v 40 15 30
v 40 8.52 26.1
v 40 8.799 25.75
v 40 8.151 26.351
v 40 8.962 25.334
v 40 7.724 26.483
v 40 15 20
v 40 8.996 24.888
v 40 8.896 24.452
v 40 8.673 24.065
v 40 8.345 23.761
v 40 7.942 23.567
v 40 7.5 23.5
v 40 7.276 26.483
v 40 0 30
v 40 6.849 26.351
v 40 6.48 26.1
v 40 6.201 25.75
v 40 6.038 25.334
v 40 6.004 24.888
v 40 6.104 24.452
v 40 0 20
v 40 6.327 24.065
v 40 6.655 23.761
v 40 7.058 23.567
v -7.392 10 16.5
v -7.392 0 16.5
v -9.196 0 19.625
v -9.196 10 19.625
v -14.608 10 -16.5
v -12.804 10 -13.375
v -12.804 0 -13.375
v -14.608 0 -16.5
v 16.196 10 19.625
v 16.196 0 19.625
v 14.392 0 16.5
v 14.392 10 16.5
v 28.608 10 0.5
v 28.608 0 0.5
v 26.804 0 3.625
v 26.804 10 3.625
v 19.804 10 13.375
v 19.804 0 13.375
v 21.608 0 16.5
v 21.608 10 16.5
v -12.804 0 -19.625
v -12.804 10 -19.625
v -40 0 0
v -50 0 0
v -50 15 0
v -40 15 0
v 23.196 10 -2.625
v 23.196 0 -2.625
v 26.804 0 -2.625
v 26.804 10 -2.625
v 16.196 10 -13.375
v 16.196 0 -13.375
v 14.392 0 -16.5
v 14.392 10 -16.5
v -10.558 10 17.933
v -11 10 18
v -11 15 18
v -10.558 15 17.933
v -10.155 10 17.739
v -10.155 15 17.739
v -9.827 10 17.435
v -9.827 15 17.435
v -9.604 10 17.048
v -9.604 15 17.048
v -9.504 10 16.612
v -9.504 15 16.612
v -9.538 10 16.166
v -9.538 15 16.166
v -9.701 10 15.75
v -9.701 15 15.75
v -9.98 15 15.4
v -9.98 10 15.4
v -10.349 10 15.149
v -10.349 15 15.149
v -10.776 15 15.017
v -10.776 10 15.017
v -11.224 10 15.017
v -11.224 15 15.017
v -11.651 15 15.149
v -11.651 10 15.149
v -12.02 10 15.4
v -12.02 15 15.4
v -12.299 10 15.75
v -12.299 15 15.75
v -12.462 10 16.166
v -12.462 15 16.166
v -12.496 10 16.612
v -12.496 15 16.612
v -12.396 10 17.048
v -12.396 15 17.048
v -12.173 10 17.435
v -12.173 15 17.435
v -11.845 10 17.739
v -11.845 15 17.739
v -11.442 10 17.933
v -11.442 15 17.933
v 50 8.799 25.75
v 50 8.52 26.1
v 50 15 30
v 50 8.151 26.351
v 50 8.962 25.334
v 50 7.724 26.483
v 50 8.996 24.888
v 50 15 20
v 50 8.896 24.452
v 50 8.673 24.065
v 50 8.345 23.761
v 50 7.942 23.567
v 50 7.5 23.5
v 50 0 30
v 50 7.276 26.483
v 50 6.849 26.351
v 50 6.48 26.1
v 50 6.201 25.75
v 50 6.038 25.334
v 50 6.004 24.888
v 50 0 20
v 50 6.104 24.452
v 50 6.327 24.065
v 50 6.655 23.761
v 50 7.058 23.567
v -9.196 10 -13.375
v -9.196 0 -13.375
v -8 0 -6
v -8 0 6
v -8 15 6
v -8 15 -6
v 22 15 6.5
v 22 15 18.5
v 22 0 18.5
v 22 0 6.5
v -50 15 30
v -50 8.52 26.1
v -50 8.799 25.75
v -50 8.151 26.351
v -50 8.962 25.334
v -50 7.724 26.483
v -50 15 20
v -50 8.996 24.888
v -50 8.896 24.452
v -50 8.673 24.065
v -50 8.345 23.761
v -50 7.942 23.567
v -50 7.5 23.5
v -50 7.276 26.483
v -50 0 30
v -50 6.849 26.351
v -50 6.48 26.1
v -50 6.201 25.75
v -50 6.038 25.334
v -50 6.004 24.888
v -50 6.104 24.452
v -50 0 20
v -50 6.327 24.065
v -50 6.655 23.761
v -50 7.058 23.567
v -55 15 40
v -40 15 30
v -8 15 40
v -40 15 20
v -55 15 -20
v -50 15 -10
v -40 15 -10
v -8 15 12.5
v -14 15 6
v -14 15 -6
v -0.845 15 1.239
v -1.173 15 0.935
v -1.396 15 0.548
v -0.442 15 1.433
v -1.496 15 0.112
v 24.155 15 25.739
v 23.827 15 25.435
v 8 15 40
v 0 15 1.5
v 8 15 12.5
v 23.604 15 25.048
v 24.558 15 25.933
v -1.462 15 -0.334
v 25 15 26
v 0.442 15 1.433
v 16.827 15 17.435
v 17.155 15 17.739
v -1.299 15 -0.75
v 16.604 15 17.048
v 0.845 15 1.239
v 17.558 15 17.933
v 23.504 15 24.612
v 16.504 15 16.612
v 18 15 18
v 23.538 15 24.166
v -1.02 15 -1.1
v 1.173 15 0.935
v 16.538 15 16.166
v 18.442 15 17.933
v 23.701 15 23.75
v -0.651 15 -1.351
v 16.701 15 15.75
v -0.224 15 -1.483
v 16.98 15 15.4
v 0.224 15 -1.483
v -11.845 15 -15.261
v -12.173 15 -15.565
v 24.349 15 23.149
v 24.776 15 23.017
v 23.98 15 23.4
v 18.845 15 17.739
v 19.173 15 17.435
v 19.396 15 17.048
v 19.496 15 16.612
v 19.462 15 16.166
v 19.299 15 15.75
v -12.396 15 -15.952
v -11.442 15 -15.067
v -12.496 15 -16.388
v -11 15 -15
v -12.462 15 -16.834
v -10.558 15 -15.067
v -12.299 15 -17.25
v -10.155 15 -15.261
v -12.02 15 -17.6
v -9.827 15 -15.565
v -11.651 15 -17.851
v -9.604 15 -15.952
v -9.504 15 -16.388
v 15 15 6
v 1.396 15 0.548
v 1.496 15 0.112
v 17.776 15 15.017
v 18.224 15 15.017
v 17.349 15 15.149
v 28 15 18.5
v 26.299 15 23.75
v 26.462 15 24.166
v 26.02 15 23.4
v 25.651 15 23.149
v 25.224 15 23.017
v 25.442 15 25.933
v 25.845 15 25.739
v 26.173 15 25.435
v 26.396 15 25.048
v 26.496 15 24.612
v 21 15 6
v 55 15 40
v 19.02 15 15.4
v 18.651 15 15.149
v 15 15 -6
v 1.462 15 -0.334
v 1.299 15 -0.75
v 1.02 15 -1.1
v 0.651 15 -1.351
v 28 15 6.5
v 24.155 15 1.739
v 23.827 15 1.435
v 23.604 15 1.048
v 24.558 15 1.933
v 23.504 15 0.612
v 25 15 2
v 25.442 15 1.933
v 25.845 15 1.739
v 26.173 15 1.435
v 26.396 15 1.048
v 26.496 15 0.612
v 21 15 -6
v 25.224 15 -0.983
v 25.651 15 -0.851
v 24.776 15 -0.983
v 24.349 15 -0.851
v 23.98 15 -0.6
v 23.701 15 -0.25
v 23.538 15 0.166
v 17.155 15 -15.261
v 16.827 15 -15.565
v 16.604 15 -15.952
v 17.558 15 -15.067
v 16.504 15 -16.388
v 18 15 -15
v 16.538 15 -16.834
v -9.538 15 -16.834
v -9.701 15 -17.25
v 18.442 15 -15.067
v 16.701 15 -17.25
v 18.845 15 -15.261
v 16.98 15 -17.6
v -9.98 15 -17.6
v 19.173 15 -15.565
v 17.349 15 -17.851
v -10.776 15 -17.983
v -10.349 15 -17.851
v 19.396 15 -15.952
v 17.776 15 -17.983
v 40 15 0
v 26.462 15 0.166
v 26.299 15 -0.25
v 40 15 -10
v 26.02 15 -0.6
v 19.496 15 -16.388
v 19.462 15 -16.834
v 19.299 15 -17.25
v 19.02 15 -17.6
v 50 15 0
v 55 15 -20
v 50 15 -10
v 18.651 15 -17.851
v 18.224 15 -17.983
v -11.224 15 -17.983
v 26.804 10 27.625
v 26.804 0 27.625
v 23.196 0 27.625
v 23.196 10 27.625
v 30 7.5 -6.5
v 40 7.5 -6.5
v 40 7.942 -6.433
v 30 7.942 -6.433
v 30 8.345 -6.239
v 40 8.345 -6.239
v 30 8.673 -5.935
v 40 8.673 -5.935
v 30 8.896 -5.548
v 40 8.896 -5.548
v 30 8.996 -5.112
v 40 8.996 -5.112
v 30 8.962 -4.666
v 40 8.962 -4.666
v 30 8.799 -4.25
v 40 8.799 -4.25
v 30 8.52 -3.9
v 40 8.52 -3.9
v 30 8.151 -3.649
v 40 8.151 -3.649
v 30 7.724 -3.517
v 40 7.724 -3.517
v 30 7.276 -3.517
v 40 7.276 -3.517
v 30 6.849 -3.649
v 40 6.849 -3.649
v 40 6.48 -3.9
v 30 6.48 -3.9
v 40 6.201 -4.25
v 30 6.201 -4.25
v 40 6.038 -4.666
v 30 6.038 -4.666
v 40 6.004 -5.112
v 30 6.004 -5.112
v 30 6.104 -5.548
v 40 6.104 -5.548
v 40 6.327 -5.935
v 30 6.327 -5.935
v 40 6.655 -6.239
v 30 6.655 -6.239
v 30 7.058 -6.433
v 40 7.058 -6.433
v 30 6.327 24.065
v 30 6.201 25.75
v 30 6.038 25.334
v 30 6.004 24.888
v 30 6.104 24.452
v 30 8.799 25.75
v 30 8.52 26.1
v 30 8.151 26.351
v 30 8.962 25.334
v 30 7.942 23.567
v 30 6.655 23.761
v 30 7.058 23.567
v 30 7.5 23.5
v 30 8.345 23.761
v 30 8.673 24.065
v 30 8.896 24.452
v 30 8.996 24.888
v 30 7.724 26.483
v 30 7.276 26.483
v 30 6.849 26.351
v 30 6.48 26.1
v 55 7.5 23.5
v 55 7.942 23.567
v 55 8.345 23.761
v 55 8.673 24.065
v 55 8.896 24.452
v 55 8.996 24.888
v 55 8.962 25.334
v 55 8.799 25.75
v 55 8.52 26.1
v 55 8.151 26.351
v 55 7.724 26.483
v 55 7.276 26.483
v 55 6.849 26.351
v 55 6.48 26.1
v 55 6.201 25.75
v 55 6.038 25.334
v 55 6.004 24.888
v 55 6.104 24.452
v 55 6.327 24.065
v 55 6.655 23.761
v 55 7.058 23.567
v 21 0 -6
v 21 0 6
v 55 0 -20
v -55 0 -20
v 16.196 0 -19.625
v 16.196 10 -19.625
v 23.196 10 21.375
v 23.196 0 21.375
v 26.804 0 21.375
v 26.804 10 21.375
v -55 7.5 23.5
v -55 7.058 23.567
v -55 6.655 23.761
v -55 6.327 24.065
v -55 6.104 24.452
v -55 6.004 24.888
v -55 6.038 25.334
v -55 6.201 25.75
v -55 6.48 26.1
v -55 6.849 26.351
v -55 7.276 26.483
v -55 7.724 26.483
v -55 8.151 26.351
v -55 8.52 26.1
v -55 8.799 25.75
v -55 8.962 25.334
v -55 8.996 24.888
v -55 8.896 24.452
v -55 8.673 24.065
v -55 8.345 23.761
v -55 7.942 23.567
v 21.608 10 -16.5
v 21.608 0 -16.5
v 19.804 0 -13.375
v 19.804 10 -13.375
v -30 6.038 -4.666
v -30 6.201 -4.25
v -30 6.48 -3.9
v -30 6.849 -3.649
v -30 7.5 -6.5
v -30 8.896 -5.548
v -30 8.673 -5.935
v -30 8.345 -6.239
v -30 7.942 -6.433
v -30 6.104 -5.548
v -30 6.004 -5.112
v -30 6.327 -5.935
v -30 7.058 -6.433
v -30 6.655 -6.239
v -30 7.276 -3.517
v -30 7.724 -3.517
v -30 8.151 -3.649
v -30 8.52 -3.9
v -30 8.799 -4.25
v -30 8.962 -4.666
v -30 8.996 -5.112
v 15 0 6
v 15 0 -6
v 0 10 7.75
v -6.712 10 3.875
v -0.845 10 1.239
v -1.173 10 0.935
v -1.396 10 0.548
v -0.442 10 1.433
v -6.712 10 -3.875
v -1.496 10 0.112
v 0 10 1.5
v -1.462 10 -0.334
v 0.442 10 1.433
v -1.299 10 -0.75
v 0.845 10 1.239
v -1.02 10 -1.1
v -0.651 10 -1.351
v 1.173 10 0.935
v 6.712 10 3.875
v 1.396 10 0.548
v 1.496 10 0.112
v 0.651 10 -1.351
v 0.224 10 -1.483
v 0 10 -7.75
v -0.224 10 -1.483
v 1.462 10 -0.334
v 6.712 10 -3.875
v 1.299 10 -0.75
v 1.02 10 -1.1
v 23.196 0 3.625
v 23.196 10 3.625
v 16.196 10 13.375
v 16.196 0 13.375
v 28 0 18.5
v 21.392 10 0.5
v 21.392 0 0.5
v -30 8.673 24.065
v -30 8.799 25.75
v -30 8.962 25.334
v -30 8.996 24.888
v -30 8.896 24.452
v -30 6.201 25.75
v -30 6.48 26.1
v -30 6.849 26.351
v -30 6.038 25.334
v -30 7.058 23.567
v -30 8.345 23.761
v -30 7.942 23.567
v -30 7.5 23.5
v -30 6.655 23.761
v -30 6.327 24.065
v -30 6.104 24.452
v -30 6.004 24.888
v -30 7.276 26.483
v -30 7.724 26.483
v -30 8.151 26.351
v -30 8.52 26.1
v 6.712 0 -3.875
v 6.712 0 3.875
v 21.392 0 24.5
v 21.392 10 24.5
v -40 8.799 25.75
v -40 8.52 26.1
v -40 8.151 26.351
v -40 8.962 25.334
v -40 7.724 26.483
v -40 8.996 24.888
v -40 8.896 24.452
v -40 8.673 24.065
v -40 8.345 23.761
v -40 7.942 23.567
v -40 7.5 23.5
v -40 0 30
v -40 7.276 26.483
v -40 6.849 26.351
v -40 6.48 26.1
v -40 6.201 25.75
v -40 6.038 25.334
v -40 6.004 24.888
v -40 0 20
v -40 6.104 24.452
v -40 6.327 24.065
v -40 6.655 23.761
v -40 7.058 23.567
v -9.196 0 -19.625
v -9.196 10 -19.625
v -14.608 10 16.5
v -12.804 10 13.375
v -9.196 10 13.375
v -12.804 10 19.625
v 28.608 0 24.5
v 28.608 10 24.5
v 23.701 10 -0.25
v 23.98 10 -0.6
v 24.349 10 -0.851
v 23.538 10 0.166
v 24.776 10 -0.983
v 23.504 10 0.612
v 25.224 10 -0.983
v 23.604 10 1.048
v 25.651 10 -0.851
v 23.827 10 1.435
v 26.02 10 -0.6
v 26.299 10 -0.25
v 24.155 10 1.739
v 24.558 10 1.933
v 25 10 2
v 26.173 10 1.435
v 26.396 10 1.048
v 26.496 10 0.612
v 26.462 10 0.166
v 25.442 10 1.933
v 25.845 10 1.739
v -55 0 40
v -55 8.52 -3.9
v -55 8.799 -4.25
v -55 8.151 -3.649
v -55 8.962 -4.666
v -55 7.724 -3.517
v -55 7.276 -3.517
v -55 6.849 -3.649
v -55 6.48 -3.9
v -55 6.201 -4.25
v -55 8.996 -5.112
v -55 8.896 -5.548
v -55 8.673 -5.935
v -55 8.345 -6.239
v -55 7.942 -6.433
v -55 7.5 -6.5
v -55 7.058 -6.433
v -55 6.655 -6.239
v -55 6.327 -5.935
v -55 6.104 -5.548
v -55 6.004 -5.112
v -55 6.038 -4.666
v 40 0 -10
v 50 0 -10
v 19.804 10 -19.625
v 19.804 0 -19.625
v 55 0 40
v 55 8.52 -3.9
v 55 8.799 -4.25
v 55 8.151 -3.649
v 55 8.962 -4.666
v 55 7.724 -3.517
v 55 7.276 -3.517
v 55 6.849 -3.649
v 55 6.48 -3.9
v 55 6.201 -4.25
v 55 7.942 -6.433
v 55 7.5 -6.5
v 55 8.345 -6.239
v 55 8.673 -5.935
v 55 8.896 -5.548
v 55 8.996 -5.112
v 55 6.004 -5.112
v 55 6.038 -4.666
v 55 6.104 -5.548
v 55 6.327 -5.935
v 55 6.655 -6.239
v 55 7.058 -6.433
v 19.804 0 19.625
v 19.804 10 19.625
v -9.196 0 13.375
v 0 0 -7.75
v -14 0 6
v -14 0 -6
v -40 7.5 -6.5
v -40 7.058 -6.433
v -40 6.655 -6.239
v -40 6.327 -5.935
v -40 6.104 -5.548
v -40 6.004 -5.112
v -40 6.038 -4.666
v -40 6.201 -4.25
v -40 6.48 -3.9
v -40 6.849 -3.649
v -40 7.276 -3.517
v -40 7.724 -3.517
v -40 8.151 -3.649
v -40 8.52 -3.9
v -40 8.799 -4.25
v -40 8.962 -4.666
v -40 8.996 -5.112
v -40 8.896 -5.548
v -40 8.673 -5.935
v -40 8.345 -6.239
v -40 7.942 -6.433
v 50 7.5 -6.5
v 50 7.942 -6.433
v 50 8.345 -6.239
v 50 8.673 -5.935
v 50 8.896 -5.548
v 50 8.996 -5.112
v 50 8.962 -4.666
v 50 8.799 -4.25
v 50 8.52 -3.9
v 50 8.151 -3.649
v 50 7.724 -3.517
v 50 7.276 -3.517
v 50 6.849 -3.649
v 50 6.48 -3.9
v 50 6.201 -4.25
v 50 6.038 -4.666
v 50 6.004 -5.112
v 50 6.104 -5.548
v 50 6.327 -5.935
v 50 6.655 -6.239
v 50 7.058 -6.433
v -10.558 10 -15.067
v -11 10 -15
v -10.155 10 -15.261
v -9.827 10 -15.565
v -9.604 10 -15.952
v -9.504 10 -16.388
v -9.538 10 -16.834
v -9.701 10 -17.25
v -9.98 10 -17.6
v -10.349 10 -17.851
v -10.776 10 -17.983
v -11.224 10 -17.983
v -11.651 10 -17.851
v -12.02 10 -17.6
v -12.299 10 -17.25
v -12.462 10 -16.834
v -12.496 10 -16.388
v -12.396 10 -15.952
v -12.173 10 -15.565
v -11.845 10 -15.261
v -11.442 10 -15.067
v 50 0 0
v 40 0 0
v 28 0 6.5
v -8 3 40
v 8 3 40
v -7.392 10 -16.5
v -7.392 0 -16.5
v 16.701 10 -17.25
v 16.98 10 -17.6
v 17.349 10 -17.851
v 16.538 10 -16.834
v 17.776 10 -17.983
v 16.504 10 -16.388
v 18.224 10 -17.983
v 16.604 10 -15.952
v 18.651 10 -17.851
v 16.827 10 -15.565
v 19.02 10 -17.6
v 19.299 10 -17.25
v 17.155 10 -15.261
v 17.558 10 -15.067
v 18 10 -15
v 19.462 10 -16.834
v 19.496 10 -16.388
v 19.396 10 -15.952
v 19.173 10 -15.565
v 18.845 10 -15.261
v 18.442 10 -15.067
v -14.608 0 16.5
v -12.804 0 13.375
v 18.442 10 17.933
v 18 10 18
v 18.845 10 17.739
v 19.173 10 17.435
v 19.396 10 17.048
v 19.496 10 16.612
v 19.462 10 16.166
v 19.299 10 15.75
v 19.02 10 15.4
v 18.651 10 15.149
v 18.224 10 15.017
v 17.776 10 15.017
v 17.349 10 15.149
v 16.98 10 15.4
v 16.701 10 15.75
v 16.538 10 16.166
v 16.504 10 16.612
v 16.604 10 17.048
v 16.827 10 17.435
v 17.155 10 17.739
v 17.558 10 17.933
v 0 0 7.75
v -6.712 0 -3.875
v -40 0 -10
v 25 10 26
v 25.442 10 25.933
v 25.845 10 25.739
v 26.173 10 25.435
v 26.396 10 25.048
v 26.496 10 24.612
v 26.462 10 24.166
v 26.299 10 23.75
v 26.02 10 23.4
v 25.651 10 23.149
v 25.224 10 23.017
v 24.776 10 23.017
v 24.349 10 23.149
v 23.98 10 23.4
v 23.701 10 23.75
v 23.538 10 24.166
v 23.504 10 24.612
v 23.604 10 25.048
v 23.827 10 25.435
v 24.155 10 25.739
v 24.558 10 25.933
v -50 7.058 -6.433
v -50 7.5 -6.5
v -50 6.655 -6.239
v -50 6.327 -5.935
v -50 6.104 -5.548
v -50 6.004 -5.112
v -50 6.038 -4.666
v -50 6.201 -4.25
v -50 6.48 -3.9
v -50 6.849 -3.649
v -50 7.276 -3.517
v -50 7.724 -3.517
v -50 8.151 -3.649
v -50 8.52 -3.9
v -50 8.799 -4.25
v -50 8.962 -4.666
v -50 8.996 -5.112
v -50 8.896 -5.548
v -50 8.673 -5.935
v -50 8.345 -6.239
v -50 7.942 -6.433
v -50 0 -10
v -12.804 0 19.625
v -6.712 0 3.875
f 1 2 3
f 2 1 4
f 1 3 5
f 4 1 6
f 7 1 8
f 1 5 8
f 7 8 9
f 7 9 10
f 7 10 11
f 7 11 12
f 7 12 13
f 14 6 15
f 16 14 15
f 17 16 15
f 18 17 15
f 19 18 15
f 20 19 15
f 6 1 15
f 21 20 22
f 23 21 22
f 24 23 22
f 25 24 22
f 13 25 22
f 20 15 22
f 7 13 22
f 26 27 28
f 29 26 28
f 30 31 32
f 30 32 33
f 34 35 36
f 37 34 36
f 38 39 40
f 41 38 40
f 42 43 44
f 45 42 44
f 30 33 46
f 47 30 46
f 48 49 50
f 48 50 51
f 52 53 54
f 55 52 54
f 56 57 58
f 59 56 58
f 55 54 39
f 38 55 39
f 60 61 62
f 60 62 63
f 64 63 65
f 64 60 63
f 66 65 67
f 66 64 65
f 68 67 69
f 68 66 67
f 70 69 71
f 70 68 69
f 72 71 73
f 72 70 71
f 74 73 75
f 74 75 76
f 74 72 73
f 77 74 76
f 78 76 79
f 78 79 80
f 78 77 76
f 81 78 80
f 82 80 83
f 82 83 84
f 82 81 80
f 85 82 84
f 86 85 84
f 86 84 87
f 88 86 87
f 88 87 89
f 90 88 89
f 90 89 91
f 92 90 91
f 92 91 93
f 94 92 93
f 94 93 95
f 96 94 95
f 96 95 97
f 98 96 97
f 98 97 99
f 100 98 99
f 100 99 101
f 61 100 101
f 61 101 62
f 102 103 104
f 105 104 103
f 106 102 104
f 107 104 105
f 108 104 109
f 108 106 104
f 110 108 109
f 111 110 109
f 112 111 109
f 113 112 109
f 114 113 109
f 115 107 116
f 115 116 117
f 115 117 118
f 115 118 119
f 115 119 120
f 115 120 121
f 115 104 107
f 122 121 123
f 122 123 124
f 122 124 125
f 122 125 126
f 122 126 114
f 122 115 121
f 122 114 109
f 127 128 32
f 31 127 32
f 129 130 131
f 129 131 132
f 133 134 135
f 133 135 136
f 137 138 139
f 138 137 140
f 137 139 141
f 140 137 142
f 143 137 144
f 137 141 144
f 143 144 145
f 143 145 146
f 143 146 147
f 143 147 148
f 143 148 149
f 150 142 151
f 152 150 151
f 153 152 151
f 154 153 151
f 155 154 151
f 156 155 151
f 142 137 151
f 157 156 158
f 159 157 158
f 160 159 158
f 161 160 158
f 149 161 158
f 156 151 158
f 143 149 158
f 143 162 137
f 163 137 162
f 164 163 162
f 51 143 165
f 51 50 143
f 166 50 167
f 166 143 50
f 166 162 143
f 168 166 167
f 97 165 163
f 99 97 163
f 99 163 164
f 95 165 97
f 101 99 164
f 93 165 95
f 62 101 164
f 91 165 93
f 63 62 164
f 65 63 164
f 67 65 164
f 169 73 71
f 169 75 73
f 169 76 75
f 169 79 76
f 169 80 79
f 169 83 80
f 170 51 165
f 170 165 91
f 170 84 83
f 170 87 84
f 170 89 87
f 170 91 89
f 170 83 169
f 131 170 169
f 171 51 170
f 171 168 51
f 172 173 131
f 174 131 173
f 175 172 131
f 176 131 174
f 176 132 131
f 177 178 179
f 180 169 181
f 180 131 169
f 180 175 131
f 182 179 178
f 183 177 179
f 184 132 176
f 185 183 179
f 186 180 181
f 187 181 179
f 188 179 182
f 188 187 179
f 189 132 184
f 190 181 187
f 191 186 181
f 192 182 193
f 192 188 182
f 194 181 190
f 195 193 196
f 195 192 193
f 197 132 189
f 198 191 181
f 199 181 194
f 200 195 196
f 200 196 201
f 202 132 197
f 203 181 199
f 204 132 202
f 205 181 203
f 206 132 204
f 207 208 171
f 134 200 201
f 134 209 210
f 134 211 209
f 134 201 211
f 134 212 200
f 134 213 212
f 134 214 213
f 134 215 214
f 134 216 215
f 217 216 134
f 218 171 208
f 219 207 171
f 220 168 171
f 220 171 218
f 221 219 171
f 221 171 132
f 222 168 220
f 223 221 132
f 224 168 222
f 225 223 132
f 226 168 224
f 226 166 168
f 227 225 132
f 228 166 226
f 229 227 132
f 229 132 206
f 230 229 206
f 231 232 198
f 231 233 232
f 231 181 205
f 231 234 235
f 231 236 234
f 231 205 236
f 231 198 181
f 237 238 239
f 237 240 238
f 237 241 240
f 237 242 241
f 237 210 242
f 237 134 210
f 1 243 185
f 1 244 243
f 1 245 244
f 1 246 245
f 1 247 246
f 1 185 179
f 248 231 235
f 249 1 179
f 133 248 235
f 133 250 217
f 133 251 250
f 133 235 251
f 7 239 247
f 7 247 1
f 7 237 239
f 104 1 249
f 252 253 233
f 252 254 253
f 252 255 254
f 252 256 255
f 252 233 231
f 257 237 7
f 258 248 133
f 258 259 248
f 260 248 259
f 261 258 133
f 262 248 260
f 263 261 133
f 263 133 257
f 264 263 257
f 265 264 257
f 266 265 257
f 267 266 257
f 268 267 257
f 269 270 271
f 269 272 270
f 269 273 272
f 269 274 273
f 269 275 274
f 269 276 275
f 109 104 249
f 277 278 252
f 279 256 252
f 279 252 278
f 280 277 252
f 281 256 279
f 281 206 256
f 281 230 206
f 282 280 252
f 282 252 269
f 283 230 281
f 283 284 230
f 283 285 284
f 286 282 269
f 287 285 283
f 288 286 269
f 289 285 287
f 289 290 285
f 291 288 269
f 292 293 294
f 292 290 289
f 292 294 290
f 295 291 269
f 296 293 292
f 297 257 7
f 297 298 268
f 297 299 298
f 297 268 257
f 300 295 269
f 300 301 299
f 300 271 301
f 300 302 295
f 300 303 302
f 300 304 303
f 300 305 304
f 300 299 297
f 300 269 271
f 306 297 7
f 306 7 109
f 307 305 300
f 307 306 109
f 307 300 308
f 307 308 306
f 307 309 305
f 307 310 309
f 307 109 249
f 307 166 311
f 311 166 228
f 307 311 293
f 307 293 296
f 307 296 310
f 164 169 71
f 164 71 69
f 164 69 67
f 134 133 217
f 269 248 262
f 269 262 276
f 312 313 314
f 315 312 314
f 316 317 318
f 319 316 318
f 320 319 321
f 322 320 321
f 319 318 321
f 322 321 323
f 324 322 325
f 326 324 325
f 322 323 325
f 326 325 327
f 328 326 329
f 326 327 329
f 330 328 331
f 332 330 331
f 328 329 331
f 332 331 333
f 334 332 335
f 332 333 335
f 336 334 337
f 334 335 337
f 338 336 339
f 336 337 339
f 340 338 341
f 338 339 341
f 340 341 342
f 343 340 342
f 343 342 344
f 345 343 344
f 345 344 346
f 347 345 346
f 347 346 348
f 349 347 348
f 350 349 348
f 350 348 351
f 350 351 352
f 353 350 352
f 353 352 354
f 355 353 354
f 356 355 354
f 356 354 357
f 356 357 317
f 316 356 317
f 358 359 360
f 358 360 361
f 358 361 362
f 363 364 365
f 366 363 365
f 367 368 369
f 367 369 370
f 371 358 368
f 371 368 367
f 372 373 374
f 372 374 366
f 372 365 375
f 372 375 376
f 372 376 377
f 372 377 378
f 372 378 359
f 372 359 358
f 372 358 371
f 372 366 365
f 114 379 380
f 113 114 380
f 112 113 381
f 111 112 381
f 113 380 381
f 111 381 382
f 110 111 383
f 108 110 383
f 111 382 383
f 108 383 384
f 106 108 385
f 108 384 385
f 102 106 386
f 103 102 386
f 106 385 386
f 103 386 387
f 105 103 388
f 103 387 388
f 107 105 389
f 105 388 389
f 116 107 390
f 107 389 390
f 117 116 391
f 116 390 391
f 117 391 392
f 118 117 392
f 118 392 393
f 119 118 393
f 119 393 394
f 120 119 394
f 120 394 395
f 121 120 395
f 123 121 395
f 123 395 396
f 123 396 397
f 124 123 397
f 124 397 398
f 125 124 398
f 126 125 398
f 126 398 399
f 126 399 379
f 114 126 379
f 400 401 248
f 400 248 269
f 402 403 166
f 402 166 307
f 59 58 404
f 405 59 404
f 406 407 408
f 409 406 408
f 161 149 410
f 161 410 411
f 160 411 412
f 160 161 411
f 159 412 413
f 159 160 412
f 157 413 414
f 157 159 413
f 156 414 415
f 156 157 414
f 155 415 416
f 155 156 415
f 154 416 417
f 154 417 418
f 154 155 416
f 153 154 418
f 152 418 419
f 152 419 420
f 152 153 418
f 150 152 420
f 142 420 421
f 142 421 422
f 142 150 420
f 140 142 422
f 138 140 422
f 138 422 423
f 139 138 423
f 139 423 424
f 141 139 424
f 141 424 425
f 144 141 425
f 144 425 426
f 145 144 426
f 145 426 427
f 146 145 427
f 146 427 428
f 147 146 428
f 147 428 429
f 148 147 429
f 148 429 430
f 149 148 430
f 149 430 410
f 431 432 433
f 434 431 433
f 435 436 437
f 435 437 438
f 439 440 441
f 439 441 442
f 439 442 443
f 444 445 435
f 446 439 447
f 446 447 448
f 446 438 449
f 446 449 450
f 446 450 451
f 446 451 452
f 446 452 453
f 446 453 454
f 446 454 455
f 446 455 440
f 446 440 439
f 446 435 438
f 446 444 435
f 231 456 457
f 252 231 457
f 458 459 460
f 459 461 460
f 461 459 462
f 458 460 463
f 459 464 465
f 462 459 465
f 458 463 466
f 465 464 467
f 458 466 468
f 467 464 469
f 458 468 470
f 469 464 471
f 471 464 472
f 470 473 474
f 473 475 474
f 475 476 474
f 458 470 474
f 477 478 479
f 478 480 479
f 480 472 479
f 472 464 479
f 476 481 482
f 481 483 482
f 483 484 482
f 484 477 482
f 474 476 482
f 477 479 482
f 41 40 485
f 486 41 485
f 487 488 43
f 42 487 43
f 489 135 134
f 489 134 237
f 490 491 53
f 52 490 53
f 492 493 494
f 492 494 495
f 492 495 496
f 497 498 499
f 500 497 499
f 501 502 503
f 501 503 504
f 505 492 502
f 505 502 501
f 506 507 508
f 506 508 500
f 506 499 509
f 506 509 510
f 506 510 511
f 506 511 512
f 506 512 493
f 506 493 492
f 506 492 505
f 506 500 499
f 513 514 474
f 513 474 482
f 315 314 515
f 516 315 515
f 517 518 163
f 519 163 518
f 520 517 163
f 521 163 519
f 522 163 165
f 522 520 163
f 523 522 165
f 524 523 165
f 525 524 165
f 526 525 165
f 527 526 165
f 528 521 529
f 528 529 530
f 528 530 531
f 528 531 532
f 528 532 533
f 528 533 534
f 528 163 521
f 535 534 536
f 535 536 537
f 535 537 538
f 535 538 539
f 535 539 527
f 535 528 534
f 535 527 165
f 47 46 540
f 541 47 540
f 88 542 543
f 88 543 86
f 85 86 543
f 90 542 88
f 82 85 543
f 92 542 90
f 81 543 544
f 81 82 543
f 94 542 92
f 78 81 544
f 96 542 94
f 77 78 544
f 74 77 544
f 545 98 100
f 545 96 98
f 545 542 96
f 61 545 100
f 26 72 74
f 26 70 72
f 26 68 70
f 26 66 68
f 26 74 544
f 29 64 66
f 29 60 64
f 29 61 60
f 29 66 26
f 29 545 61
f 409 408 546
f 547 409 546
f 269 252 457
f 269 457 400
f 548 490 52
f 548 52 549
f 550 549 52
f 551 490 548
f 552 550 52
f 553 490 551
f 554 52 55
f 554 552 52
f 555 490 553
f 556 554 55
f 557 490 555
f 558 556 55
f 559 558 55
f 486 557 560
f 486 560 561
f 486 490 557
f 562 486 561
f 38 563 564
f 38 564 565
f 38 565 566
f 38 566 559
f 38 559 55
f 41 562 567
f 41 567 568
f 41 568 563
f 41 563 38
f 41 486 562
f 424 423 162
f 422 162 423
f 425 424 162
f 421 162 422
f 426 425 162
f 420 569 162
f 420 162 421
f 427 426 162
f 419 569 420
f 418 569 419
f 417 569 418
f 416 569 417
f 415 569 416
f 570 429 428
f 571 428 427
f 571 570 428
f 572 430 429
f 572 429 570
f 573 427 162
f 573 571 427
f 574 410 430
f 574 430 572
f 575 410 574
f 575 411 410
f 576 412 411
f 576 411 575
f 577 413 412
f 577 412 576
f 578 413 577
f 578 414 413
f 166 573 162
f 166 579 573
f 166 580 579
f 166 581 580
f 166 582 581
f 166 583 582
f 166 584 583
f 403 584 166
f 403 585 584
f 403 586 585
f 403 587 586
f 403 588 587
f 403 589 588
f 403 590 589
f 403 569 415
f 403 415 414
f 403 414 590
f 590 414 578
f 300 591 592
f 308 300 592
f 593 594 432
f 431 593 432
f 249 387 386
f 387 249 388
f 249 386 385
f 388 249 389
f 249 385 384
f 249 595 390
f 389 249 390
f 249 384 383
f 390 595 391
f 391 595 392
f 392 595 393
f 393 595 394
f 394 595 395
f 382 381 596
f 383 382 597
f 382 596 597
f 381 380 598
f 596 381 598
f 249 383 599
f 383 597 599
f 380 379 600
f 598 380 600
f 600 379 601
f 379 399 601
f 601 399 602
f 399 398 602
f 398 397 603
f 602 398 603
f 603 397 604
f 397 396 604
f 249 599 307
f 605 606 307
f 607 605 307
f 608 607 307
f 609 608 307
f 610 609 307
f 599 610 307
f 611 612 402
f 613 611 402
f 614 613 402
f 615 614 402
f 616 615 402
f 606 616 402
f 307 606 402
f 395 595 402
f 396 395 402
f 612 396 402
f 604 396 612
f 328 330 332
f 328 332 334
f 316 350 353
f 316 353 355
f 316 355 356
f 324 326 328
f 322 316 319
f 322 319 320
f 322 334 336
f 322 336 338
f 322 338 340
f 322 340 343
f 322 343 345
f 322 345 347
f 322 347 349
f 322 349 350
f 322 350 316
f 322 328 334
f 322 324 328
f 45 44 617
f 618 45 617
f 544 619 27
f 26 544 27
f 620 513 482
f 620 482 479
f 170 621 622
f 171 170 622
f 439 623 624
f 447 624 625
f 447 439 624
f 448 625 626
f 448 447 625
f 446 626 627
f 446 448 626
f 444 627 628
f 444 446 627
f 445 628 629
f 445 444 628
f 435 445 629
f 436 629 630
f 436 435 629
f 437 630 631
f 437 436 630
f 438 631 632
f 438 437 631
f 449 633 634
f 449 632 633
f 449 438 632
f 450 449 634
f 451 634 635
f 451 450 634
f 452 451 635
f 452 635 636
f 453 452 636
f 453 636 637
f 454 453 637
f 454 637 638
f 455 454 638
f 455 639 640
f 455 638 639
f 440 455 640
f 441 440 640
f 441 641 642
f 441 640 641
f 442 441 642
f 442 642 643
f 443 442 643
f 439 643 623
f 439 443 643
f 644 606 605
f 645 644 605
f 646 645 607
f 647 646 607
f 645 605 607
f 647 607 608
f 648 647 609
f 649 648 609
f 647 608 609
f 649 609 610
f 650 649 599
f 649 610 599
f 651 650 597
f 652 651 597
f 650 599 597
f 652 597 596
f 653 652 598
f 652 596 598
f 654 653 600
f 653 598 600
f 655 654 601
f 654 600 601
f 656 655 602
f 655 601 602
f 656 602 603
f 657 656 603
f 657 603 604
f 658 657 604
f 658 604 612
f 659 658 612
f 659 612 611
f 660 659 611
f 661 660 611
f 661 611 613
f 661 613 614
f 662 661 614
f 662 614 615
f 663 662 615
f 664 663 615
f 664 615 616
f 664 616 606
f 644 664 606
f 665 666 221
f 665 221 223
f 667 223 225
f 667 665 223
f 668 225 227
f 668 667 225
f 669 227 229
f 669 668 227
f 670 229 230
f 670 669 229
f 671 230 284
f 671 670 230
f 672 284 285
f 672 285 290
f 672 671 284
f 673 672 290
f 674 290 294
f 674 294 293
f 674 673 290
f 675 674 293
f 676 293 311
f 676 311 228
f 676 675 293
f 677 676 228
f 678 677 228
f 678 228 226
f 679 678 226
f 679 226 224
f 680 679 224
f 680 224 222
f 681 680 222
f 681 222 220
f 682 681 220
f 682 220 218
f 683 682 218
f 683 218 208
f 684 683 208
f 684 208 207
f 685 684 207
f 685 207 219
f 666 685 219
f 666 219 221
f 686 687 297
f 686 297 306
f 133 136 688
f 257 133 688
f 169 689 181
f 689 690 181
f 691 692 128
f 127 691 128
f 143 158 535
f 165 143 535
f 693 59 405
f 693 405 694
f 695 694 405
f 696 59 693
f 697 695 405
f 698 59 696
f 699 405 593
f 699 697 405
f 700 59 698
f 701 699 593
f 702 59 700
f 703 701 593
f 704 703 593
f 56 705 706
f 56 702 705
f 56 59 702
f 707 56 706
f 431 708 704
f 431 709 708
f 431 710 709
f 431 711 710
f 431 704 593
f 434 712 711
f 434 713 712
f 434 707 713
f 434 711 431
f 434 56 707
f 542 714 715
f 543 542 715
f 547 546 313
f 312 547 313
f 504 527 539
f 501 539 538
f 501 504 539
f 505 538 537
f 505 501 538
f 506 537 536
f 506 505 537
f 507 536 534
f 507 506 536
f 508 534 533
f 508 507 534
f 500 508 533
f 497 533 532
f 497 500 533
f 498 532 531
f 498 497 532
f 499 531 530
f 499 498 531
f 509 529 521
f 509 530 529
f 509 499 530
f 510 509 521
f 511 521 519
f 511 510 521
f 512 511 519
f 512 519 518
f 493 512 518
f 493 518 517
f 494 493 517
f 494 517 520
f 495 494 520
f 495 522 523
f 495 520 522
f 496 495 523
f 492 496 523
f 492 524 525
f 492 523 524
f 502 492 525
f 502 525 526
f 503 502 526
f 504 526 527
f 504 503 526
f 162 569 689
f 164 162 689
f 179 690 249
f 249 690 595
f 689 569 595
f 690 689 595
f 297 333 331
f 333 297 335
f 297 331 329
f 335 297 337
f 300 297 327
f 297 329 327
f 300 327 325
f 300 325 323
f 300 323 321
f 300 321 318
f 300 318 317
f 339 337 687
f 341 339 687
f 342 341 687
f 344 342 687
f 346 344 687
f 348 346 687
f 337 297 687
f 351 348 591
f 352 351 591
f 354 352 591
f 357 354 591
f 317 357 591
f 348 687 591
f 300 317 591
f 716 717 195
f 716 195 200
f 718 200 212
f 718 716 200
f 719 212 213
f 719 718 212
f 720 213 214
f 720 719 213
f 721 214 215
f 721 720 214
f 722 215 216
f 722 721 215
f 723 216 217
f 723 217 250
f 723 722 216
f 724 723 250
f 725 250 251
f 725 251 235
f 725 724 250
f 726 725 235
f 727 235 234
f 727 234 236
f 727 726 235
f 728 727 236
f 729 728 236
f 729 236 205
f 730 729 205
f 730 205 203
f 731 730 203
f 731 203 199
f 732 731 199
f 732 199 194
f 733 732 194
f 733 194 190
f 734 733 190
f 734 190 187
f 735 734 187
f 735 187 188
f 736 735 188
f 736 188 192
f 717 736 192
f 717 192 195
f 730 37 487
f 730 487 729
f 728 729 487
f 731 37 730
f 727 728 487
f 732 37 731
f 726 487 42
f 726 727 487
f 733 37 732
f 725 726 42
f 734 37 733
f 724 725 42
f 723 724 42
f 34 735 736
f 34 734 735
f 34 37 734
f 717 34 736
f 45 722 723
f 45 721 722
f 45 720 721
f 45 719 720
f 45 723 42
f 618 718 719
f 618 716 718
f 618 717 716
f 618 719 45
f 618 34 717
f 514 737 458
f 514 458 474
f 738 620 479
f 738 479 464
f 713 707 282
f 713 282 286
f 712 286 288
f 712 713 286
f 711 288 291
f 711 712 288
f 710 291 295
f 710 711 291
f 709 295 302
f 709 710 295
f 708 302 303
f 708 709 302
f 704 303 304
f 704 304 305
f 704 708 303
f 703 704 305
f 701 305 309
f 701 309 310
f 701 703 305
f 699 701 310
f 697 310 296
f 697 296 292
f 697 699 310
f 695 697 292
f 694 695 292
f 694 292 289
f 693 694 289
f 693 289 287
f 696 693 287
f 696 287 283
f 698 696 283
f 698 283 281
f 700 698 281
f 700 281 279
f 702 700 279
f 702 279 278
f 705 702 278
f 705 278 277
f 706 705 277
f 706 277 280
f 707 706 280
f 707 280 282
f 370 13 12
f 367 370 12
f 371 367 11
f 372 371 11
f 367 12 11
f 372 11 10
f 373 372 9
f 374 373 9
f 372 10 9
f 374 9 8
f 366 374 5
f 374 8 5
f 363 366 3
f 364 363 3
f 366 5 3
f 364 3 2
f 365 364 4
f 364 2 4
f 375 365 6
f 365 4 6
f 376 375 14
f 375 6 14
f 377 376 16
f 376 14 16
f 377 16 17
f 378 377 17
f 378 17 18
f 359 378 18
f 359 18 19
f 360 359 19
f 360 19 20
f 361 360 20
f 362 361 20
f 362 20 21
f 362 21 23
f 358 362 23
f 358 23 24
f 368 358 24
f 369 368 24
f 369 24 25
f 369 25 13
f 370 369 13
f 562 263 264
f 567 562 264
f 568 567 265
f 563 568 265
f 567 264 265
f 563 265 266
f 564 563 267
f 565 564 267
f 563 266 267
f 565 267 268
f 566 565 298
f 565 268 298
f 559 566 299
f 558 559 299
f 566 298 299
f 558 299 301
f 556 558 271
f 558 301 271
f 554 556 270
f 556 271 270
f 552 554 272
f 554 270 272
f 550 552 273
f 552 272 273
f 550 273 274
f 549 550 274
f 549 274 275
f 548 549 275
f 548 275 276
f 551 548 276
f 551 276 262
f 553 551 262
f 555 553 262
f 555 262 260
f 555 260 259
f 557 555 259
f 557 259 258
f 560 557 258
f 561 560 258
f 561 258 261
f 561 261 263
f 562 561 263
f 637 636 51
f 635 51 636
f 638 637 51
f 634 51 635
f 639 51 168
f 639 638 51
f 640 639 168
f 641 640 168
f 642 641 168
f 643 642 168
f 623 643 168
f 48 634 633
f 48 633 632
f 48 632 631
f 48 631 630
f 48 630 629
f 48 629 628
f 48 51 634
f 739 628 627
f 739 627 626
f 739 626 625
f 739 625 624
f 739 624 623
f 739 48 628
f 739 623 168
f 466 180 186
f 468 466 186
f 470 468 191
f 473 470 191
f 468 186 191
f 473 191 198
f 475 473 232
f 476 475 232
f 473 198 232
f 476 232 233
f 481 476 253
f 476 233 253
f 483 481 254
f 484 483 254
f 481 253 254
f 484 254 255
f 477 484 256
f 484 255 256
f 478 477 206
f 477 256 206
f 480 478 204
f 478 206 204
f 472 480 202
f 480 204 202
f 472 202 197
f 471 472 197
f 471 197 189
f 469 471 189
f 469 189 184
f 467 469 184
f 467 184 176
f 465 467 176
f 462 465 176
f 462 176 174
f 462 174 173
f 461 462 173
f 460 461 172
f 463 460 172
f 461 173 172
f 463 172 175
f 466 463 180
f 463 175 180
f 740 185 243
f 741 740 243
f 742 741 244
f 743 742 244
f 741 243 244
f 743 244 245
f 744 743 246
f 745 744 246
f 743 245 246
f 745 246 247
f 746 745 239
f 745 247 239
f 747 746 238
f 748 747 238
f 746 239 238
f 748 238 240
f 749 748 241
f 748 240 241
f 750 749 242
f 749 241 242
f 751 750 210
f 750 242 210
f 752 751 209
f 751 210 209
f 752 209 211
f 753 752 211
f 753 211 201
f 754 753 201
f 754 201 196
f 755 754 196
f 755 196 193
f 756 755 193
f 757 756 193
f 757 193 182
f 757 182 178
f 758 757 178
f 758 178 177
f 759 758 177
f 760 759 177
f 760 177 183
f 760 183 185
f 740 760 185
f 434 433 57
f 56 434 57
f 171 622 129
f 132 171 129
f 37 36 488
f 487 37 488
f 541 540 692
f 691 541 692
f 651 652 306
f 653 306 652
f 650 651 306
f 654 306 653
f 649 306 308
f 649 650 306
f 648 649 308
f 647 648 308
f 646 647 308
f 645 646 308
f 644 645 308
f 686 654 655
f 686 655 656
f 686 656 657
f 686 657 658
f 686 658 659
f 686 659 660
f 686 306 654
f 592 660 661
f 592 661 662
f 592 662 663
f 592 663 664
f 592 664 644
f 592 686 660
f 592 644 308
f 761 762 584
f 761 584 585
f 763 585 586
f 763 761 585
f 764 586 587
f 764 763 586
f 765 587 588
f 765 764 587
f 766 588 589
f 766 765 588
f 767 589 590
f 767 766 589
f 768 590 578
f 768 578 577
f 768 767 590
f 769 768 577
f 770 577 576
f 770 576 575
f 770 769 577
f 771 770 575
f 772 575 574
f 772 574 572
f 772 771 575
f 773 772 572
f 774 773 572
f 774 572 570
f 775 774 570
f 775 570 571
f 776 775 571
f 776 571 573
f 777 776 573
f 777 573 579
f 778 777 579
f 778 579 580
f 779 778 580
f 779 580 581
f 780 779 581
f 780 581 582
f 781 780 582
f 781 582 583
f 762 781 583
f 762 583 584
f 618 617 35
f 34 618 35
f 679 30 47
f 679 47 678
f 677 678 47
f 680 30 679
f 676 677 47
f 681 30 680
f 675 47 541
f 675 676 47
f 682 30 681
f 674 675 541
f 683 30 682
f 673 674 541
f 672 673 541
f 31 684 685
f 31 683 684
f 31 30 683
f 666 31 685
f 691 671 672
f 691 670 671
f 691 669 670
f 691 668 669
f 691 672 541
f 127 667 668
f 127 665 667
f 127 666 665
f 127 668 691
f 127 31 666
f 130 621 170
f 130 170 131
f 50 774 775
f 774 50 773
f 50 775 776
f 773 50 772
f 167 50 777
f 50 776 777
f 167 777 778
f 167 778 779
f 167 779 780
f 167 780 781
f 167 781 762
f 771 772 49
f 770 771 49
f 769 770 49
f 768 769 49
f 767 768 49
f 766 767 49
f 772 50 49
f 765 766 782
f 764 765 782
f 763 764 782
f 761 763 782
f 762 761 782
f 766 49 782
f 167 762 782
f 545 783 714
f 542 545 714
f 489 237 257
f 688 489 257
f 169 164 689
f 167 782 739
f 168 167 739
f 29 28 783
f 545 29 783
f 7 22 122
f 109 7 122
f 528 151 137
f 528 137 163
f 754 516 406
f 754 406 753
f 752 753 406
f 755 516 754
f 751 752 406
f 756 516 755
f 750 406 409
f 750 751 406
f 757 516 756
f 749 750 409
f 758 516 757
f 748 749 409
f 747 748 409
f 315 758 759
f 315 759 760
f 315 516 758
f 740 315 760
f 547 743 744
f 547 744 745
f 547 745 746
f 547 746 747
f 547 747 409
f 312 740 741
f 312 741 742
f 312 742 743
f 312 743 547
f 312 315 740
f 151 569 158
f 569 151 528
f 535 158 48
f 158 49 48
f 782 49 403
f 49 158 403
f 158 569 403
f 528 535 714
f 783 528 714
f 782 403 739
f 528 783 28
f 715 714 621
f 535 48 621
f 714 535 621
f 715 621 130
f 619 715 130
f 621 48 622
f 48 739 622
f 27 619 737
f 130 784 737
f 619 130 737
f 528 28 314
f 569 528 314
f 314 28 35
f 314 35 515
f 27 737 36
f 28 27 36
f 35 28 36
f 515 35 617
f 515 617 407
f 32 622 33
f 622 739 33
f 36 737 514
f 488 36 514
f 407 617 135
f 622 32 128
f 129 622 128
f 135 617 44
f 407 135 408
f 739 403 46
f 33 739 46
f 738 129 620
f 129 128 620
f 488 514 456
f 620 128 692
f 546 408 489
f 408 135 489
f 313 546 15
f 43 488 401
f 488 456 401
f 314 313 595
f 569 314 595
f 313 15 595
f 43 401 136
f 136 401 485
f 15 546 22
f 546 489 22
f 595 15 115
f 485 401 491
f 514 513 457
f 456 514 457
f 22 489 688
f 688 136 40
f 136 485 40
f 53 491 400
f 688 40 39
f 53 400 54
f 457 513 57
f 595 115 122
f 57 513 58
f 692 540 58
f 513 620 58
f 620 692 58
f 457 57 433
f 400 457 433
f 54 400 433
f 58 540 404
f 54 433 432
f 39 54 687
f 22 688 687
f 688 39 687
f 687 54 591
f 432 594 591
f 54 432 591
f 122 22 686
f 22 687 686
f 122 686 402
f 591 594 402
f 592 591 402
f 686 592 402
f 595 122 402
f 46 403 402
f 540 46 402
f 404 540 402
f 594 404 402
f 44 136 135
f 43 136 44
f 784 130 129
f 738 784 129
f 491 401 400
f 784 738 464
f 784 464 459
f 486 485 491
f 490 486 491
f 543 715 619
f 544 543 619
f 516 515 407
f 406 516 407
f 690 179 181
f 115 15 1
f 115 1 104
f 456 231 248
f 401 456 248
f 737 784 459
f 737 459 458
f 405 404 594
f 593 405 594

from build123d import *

# Parameters (mm, degrees)
CROQUIS1_W              = 80
CROQUIS1_H              = 60
CROQUIS1_R              = 1.5
CROQUIS1_W_2            = 6
CROQUIS1_H_2            = 25
CROQUIS1_W_3            = 10
CROQUIS1_H_3            = 20
CROQUIS1_H_4            = 10
CROQUIS1_W_4            = 5
CROQUIS1_H_5            = 6.5
SALIENTE_EXTRUIR1_DEPTH = 15
CORTAR_EXTRUIR1_DEPTH   = 10
CROQUIS3_R              = 1.5
CORTAR_EXTRUIR2_DEPTH   = 25
CORTAR_EXTRUIR3_START   = -25
CROQUIS6_R              = 1.5
CORTAR_EXTRUIR3_DEPTH   = 25
CROQUIS8_W              = 16
CROQUIS8_H              = 17.848141148
CROQUIS8_R              = 1.5
SALIENTE_EXTRUIR2_DEPTH = 5
CORTAR_EXTRUIR4_START   = -55
CORTAR_EXTRUIR4_DEPTH   = 8
CROQUIS10_R             = 1.5
CROQUIS10_W             = 6
CROQUIS10_H             = 12
CORTAR_EXTRUIR5_DEPTH   = 16
CORTAR_EXTRUIR6_DEPTH   = 10


with BuildPart() as part:
    # Croquis1 → Saliente-Extruir1 (new body)
    # profile 1 of 13: a face of its own
    with BuildSketch(Plane(origin=(0, 0, 0), x_dir=(1, 0, 0), z_dir=(0, 1, 0))):
        with Locations((0, -10)):
            Rectangle(CROQUIS1_W, CROQUIS1_H)
        with Locations(Location((18, -16.5, 0), (0, 0, 270))):
            Circle(CROQUIS1_R, mode=Mode.SUBTRACT)
        with Locations(Location((-11, -16.5, 0), (0, 0, 270))):
            Circle(CROQUIS1_R, mode=Mode.SUBTRACT)
        with Locations(Location((18, 16.5, 0), (0, 0, 270))):
            Circle(CROQUIS1_R, mode=Mode.SUBTRACT)
        with Locations(Location((-11, 16.5, 0), (0, 0, 270))):
            Circle(CROQUIS1_R, mode=Mode.SUBTRACT)
        with Locations((18, 0)):
            Rectangle(CROQUIS1_W_2, CROQUIS1_H_2, mode=Mode.SUBTRACT)
        Polygon((6.711696879, 3.875), (0, 7.75), (-6.711696879, 3.875), (-6.711696879, -3.875), (0, -7.75), (6.711696879, -3.875), align=None, mode=Mode.SUBTRACT)
        with Locations((-11, 0)):
            Rectangle(CROQUIS1_W_2, CROQUIS1_H_2, mode=Mode.SUBTRACT)
    # profile 2 of 13: a face of its own
    with BuildSketch(Plane(origin=(0, 0, 0), x_dir=(1, 0, 0), z_dir=(0, 1, 0))):
        with Locations((-45, -10)):
            Rectangle(CROQUIS1_W_3, CROQUIS1_H_3)
    # profile 3 of 13: a face of its own
    with BuildSketch(Plane(origin=(0, 0, 0), x_dir=(1, 0, 0), z_dir=(0, 1, 0))):
        with Locations((-45, -35)):
            Rectangle(CROQUIS1_W_3, CROQUIS1_H_4)
    # profile 4 of 13: a face of its own
    with BuildSketch(Plane(origin=(0, 0, 0), x_dir=(1, 0, 0), z_dir=(0, 1, 0))):
        with Locations((-52.5, -10)):
            Rectangle(CROQUIS1_W_4, CROQUIS1_H)
    # profile 5 of 13: a face of its own
    with BuildSketch(Plane(origin=(0, 0, 0), x_dir=(1, 0, 0), z_dir=(0, 1, 0))):
        with Locations((-45, 15)):
            Rectangle(CROQUIS1_W_3, CROQUIS1_H_4)
    # profile 6 of 13: a face of its own
    with BuildSketch(Plane(origin=(0, 0, 0), x_dir=(1, 0, 0), z_dir=(0, 1, 0))):
        with Locations((45, 15)):
            Rectangle(CROQUIS1_W_3, CROQUIS1_H_4)
    # profile 7 of 13: a face of its own
    with BuildSketch(Plane(origin=(0, 0, 0), x_dir=(1, 0, 0), z_dir=(0, 1, 0))):
        with Locations((52.5, -10)):
            Rectangle(CROQUIS1_W_4, CROQUIS1_H)
    # profile 8 of 13: a face of its own
    with BuildSketch(Plane(origin=(0, 0, 0), x_dir=(1, 0, 0), z_dir=(0, 1, 0))):
        with Locations((45, -10)):
            Rectangle(CROQUIS1_W_3, CROQUIS1_H_3)
    # profile 9 of 13: a face of its own
    with BuildSketch(Plane(origin=(0, 0, 0), x_dir=(1, 0, 0), z_dir=(0, 1, 0))):
        with Locations((45, -35)):
            Rectangle(CROQUIS1_W_3, CROQUIS1_H_4)
    # profile 10 of 13: a face of its own
    with BuildSketch(Plane(origin=(0, 0, 0), x_dir=(1, 0, 0), z_dir=(0, 1, 0))):
        with Locations((-11, 9.25)):
            Rectangle(CROQUIS1_W_2, CROQUIS1_H_5)
    # profile 11 of 13: a face of its own
    with BuildSketch(Plane(origin=(0, 0, 0), x_dir=(1, 0, 0), z_dir=(0, 1, 0))):
        with Locations((-11, -9.25)):
            Rectangle(CROQUIS1_W_2, CROQUIS1_H_5)
    # profile 12 of 13: a face of its own
    with BuildSketch(Plane(origin=(0, 0, 0), x_dir=(1, 0, 0), z_dir=(0, 1, 0))):
        with Locations((18, 9.25)):
            Rectangle(CROQUIS1_W_2, CROQUIS1_H_5)
    # profile 13 of 13: a face of its own
    with BuildSketch(Plane(origin=(0, 0, 0), x_dir=(1, 0, 0), z_dir=(0, 1, 0))):
        with Locations((18, -9.25)):
            Rectangle(CROQUIS1_W_2, CROQUIS1_H_5)
    extrude(amount=SALIENTE_EXTRUIR1_DEPTH)

    # Croquis2 → Cortar-Extruir1 (cut)
    with BuildSketch(Plane.XZ):
        Polygon((-7.391560818, 16.5), (-9.195780409, 19.625), (-12.804219591, 19.625), (-14.608439182, 16.5), (-12.804219591, 13.375), (-9.195780409, 13.375), align=None)
        Polygon((21.608439182, 16.5), (19.804219591, 19.625), (16.195780409, 19.625), (14.391560818, 16.5), (16.195780409, 13.375), (19.804219591, 13.375), align=None)
        Polygon((-7.391560818, -16.5), (-9.195780409, -13.375), (-12.804219591, -13.375), (-14.608439182, -16.5), (-12.804219591, -19.625), (-9.195780409, -19.625), align=None)
        Polygon((21.608439182, -16.5), (19.804219591, -13.375), (16.195780409, -13.375), (14.391560818, -16.5), (16.195780409, -19.625), (19.804219591, -19.625), align=None)
    extrude(amount=-CORTAR_EXTRUIR1_DEPTH, mode=Mode.SUBTRACT)

    # Croquis3 → Cortar-Extruir2 (cut)
    with BuildSketch(Plane(origin=(55, 0, 0), x_dir=(0, 0, -1), z_dir=(1, 0, 0))):
        with Locations((-25, 7.5)):
            Circle(CROQUIS3_R)
        with Locations((5, 7.5)):
            Circle(CROQUIS3_R)
    extrude(amount=-CORTAR_EXTRUIR2_DEPTH, mode=Mode.SUBTRACT)

    # Croquis6 → Cortar-Extruir3 (cut)
    with BuildSketch(Plane.ZY.offset(55).offset(CORTAR_EXTRUIR3_START)):
        with Locations(Location((-5, 7.5, 0), (0, 0, 180))):
            Circle(CROQUIS6_R)
        with Locations(Location((25, 7.5, 0), (0, 0, 180))):
            Circle(CROQUIS6_R)
    extrude(amount=CORTAR_EXTRUIR3_DEPTH, mode=Mode.SUBTRACT)

    # Croquis8 → Saliente-Extruir2 (add)
    with BuildSketch(Plane(origin=(0, 15, 0), x_dir=(1, 0, 0), z_dir=(0, 1, 0))):
        Rectangle(CROQUIS8_W, CROQUIS8_H)
        with Locations(Location((0, 0, 0), (0, 0, 270))):
            Circle(CROQUIS8_R, mode=Mode.SUBTRACT)
    extrude(amount=-SALIENTE_EXTRUIR2_DEPTH)

    # Croquis9 → Cortar-Extruir4 (cut, symmetric)
    with BuildSketch(Plane(origin=(55, 0, 0), x_dir=(0, 0, -1), z_dir=(1, 0, 0)).offset(CORTAR_EXTRUIR4_START)):
        Polygon((-40, 3), (-12.5, 15), (-40, 15), align=None)
    extrude(amount=CORTAR_EXTRUIR4_DEPTH, both=True, mode=Mode.SUBTRACT)

    # Croquis10 → Cortar-Extruir5 (cut)
    with BuildSketch(Plane(origin=(0, 15, 0), x_dir=(1, 0, 0), z_dir=(0, 1, 0))):
        with Locations(Location((25, -0.5, 0), (0, 0, 270))):
            Circle(CROQUIS10_R)
        with Locations(Location((25, -24.5, 0), (0, 0, 270))):
            Circle(CROQUIS10_R)
        with Locations((25, -12.5)):
            Rectangle(CROQUIS10_W, CROQUIS10_H)
    extrude(amount=-CORTAR_EXTRUIR5_DEPTH, mode=Mode.SUBTRACT)

    # Croquis11 → Cortar-Extruir6 (cut)
    with BuildSketch(Plane.XZ):
        Polygon((28.608439182, 24.5), (26.804219591, 27.625), (23.195780409, 27.625), (21.391560818, 24.5), (23.195780409, 21.375), (26.804219591, 21.375), align=None)
        Polygon((28.608439182, 0.5), (26.804219591, 3.625), (23.195780409, 3.625), (21.391560818, 0.5), (23.195780409, -2.625), (26.804219591, -2.625), align=None)
    extrude(amount=-CORTAR_EXTRUIR6_DEPTH, mode=Mode.SUBTRACT)


solid = part.part
